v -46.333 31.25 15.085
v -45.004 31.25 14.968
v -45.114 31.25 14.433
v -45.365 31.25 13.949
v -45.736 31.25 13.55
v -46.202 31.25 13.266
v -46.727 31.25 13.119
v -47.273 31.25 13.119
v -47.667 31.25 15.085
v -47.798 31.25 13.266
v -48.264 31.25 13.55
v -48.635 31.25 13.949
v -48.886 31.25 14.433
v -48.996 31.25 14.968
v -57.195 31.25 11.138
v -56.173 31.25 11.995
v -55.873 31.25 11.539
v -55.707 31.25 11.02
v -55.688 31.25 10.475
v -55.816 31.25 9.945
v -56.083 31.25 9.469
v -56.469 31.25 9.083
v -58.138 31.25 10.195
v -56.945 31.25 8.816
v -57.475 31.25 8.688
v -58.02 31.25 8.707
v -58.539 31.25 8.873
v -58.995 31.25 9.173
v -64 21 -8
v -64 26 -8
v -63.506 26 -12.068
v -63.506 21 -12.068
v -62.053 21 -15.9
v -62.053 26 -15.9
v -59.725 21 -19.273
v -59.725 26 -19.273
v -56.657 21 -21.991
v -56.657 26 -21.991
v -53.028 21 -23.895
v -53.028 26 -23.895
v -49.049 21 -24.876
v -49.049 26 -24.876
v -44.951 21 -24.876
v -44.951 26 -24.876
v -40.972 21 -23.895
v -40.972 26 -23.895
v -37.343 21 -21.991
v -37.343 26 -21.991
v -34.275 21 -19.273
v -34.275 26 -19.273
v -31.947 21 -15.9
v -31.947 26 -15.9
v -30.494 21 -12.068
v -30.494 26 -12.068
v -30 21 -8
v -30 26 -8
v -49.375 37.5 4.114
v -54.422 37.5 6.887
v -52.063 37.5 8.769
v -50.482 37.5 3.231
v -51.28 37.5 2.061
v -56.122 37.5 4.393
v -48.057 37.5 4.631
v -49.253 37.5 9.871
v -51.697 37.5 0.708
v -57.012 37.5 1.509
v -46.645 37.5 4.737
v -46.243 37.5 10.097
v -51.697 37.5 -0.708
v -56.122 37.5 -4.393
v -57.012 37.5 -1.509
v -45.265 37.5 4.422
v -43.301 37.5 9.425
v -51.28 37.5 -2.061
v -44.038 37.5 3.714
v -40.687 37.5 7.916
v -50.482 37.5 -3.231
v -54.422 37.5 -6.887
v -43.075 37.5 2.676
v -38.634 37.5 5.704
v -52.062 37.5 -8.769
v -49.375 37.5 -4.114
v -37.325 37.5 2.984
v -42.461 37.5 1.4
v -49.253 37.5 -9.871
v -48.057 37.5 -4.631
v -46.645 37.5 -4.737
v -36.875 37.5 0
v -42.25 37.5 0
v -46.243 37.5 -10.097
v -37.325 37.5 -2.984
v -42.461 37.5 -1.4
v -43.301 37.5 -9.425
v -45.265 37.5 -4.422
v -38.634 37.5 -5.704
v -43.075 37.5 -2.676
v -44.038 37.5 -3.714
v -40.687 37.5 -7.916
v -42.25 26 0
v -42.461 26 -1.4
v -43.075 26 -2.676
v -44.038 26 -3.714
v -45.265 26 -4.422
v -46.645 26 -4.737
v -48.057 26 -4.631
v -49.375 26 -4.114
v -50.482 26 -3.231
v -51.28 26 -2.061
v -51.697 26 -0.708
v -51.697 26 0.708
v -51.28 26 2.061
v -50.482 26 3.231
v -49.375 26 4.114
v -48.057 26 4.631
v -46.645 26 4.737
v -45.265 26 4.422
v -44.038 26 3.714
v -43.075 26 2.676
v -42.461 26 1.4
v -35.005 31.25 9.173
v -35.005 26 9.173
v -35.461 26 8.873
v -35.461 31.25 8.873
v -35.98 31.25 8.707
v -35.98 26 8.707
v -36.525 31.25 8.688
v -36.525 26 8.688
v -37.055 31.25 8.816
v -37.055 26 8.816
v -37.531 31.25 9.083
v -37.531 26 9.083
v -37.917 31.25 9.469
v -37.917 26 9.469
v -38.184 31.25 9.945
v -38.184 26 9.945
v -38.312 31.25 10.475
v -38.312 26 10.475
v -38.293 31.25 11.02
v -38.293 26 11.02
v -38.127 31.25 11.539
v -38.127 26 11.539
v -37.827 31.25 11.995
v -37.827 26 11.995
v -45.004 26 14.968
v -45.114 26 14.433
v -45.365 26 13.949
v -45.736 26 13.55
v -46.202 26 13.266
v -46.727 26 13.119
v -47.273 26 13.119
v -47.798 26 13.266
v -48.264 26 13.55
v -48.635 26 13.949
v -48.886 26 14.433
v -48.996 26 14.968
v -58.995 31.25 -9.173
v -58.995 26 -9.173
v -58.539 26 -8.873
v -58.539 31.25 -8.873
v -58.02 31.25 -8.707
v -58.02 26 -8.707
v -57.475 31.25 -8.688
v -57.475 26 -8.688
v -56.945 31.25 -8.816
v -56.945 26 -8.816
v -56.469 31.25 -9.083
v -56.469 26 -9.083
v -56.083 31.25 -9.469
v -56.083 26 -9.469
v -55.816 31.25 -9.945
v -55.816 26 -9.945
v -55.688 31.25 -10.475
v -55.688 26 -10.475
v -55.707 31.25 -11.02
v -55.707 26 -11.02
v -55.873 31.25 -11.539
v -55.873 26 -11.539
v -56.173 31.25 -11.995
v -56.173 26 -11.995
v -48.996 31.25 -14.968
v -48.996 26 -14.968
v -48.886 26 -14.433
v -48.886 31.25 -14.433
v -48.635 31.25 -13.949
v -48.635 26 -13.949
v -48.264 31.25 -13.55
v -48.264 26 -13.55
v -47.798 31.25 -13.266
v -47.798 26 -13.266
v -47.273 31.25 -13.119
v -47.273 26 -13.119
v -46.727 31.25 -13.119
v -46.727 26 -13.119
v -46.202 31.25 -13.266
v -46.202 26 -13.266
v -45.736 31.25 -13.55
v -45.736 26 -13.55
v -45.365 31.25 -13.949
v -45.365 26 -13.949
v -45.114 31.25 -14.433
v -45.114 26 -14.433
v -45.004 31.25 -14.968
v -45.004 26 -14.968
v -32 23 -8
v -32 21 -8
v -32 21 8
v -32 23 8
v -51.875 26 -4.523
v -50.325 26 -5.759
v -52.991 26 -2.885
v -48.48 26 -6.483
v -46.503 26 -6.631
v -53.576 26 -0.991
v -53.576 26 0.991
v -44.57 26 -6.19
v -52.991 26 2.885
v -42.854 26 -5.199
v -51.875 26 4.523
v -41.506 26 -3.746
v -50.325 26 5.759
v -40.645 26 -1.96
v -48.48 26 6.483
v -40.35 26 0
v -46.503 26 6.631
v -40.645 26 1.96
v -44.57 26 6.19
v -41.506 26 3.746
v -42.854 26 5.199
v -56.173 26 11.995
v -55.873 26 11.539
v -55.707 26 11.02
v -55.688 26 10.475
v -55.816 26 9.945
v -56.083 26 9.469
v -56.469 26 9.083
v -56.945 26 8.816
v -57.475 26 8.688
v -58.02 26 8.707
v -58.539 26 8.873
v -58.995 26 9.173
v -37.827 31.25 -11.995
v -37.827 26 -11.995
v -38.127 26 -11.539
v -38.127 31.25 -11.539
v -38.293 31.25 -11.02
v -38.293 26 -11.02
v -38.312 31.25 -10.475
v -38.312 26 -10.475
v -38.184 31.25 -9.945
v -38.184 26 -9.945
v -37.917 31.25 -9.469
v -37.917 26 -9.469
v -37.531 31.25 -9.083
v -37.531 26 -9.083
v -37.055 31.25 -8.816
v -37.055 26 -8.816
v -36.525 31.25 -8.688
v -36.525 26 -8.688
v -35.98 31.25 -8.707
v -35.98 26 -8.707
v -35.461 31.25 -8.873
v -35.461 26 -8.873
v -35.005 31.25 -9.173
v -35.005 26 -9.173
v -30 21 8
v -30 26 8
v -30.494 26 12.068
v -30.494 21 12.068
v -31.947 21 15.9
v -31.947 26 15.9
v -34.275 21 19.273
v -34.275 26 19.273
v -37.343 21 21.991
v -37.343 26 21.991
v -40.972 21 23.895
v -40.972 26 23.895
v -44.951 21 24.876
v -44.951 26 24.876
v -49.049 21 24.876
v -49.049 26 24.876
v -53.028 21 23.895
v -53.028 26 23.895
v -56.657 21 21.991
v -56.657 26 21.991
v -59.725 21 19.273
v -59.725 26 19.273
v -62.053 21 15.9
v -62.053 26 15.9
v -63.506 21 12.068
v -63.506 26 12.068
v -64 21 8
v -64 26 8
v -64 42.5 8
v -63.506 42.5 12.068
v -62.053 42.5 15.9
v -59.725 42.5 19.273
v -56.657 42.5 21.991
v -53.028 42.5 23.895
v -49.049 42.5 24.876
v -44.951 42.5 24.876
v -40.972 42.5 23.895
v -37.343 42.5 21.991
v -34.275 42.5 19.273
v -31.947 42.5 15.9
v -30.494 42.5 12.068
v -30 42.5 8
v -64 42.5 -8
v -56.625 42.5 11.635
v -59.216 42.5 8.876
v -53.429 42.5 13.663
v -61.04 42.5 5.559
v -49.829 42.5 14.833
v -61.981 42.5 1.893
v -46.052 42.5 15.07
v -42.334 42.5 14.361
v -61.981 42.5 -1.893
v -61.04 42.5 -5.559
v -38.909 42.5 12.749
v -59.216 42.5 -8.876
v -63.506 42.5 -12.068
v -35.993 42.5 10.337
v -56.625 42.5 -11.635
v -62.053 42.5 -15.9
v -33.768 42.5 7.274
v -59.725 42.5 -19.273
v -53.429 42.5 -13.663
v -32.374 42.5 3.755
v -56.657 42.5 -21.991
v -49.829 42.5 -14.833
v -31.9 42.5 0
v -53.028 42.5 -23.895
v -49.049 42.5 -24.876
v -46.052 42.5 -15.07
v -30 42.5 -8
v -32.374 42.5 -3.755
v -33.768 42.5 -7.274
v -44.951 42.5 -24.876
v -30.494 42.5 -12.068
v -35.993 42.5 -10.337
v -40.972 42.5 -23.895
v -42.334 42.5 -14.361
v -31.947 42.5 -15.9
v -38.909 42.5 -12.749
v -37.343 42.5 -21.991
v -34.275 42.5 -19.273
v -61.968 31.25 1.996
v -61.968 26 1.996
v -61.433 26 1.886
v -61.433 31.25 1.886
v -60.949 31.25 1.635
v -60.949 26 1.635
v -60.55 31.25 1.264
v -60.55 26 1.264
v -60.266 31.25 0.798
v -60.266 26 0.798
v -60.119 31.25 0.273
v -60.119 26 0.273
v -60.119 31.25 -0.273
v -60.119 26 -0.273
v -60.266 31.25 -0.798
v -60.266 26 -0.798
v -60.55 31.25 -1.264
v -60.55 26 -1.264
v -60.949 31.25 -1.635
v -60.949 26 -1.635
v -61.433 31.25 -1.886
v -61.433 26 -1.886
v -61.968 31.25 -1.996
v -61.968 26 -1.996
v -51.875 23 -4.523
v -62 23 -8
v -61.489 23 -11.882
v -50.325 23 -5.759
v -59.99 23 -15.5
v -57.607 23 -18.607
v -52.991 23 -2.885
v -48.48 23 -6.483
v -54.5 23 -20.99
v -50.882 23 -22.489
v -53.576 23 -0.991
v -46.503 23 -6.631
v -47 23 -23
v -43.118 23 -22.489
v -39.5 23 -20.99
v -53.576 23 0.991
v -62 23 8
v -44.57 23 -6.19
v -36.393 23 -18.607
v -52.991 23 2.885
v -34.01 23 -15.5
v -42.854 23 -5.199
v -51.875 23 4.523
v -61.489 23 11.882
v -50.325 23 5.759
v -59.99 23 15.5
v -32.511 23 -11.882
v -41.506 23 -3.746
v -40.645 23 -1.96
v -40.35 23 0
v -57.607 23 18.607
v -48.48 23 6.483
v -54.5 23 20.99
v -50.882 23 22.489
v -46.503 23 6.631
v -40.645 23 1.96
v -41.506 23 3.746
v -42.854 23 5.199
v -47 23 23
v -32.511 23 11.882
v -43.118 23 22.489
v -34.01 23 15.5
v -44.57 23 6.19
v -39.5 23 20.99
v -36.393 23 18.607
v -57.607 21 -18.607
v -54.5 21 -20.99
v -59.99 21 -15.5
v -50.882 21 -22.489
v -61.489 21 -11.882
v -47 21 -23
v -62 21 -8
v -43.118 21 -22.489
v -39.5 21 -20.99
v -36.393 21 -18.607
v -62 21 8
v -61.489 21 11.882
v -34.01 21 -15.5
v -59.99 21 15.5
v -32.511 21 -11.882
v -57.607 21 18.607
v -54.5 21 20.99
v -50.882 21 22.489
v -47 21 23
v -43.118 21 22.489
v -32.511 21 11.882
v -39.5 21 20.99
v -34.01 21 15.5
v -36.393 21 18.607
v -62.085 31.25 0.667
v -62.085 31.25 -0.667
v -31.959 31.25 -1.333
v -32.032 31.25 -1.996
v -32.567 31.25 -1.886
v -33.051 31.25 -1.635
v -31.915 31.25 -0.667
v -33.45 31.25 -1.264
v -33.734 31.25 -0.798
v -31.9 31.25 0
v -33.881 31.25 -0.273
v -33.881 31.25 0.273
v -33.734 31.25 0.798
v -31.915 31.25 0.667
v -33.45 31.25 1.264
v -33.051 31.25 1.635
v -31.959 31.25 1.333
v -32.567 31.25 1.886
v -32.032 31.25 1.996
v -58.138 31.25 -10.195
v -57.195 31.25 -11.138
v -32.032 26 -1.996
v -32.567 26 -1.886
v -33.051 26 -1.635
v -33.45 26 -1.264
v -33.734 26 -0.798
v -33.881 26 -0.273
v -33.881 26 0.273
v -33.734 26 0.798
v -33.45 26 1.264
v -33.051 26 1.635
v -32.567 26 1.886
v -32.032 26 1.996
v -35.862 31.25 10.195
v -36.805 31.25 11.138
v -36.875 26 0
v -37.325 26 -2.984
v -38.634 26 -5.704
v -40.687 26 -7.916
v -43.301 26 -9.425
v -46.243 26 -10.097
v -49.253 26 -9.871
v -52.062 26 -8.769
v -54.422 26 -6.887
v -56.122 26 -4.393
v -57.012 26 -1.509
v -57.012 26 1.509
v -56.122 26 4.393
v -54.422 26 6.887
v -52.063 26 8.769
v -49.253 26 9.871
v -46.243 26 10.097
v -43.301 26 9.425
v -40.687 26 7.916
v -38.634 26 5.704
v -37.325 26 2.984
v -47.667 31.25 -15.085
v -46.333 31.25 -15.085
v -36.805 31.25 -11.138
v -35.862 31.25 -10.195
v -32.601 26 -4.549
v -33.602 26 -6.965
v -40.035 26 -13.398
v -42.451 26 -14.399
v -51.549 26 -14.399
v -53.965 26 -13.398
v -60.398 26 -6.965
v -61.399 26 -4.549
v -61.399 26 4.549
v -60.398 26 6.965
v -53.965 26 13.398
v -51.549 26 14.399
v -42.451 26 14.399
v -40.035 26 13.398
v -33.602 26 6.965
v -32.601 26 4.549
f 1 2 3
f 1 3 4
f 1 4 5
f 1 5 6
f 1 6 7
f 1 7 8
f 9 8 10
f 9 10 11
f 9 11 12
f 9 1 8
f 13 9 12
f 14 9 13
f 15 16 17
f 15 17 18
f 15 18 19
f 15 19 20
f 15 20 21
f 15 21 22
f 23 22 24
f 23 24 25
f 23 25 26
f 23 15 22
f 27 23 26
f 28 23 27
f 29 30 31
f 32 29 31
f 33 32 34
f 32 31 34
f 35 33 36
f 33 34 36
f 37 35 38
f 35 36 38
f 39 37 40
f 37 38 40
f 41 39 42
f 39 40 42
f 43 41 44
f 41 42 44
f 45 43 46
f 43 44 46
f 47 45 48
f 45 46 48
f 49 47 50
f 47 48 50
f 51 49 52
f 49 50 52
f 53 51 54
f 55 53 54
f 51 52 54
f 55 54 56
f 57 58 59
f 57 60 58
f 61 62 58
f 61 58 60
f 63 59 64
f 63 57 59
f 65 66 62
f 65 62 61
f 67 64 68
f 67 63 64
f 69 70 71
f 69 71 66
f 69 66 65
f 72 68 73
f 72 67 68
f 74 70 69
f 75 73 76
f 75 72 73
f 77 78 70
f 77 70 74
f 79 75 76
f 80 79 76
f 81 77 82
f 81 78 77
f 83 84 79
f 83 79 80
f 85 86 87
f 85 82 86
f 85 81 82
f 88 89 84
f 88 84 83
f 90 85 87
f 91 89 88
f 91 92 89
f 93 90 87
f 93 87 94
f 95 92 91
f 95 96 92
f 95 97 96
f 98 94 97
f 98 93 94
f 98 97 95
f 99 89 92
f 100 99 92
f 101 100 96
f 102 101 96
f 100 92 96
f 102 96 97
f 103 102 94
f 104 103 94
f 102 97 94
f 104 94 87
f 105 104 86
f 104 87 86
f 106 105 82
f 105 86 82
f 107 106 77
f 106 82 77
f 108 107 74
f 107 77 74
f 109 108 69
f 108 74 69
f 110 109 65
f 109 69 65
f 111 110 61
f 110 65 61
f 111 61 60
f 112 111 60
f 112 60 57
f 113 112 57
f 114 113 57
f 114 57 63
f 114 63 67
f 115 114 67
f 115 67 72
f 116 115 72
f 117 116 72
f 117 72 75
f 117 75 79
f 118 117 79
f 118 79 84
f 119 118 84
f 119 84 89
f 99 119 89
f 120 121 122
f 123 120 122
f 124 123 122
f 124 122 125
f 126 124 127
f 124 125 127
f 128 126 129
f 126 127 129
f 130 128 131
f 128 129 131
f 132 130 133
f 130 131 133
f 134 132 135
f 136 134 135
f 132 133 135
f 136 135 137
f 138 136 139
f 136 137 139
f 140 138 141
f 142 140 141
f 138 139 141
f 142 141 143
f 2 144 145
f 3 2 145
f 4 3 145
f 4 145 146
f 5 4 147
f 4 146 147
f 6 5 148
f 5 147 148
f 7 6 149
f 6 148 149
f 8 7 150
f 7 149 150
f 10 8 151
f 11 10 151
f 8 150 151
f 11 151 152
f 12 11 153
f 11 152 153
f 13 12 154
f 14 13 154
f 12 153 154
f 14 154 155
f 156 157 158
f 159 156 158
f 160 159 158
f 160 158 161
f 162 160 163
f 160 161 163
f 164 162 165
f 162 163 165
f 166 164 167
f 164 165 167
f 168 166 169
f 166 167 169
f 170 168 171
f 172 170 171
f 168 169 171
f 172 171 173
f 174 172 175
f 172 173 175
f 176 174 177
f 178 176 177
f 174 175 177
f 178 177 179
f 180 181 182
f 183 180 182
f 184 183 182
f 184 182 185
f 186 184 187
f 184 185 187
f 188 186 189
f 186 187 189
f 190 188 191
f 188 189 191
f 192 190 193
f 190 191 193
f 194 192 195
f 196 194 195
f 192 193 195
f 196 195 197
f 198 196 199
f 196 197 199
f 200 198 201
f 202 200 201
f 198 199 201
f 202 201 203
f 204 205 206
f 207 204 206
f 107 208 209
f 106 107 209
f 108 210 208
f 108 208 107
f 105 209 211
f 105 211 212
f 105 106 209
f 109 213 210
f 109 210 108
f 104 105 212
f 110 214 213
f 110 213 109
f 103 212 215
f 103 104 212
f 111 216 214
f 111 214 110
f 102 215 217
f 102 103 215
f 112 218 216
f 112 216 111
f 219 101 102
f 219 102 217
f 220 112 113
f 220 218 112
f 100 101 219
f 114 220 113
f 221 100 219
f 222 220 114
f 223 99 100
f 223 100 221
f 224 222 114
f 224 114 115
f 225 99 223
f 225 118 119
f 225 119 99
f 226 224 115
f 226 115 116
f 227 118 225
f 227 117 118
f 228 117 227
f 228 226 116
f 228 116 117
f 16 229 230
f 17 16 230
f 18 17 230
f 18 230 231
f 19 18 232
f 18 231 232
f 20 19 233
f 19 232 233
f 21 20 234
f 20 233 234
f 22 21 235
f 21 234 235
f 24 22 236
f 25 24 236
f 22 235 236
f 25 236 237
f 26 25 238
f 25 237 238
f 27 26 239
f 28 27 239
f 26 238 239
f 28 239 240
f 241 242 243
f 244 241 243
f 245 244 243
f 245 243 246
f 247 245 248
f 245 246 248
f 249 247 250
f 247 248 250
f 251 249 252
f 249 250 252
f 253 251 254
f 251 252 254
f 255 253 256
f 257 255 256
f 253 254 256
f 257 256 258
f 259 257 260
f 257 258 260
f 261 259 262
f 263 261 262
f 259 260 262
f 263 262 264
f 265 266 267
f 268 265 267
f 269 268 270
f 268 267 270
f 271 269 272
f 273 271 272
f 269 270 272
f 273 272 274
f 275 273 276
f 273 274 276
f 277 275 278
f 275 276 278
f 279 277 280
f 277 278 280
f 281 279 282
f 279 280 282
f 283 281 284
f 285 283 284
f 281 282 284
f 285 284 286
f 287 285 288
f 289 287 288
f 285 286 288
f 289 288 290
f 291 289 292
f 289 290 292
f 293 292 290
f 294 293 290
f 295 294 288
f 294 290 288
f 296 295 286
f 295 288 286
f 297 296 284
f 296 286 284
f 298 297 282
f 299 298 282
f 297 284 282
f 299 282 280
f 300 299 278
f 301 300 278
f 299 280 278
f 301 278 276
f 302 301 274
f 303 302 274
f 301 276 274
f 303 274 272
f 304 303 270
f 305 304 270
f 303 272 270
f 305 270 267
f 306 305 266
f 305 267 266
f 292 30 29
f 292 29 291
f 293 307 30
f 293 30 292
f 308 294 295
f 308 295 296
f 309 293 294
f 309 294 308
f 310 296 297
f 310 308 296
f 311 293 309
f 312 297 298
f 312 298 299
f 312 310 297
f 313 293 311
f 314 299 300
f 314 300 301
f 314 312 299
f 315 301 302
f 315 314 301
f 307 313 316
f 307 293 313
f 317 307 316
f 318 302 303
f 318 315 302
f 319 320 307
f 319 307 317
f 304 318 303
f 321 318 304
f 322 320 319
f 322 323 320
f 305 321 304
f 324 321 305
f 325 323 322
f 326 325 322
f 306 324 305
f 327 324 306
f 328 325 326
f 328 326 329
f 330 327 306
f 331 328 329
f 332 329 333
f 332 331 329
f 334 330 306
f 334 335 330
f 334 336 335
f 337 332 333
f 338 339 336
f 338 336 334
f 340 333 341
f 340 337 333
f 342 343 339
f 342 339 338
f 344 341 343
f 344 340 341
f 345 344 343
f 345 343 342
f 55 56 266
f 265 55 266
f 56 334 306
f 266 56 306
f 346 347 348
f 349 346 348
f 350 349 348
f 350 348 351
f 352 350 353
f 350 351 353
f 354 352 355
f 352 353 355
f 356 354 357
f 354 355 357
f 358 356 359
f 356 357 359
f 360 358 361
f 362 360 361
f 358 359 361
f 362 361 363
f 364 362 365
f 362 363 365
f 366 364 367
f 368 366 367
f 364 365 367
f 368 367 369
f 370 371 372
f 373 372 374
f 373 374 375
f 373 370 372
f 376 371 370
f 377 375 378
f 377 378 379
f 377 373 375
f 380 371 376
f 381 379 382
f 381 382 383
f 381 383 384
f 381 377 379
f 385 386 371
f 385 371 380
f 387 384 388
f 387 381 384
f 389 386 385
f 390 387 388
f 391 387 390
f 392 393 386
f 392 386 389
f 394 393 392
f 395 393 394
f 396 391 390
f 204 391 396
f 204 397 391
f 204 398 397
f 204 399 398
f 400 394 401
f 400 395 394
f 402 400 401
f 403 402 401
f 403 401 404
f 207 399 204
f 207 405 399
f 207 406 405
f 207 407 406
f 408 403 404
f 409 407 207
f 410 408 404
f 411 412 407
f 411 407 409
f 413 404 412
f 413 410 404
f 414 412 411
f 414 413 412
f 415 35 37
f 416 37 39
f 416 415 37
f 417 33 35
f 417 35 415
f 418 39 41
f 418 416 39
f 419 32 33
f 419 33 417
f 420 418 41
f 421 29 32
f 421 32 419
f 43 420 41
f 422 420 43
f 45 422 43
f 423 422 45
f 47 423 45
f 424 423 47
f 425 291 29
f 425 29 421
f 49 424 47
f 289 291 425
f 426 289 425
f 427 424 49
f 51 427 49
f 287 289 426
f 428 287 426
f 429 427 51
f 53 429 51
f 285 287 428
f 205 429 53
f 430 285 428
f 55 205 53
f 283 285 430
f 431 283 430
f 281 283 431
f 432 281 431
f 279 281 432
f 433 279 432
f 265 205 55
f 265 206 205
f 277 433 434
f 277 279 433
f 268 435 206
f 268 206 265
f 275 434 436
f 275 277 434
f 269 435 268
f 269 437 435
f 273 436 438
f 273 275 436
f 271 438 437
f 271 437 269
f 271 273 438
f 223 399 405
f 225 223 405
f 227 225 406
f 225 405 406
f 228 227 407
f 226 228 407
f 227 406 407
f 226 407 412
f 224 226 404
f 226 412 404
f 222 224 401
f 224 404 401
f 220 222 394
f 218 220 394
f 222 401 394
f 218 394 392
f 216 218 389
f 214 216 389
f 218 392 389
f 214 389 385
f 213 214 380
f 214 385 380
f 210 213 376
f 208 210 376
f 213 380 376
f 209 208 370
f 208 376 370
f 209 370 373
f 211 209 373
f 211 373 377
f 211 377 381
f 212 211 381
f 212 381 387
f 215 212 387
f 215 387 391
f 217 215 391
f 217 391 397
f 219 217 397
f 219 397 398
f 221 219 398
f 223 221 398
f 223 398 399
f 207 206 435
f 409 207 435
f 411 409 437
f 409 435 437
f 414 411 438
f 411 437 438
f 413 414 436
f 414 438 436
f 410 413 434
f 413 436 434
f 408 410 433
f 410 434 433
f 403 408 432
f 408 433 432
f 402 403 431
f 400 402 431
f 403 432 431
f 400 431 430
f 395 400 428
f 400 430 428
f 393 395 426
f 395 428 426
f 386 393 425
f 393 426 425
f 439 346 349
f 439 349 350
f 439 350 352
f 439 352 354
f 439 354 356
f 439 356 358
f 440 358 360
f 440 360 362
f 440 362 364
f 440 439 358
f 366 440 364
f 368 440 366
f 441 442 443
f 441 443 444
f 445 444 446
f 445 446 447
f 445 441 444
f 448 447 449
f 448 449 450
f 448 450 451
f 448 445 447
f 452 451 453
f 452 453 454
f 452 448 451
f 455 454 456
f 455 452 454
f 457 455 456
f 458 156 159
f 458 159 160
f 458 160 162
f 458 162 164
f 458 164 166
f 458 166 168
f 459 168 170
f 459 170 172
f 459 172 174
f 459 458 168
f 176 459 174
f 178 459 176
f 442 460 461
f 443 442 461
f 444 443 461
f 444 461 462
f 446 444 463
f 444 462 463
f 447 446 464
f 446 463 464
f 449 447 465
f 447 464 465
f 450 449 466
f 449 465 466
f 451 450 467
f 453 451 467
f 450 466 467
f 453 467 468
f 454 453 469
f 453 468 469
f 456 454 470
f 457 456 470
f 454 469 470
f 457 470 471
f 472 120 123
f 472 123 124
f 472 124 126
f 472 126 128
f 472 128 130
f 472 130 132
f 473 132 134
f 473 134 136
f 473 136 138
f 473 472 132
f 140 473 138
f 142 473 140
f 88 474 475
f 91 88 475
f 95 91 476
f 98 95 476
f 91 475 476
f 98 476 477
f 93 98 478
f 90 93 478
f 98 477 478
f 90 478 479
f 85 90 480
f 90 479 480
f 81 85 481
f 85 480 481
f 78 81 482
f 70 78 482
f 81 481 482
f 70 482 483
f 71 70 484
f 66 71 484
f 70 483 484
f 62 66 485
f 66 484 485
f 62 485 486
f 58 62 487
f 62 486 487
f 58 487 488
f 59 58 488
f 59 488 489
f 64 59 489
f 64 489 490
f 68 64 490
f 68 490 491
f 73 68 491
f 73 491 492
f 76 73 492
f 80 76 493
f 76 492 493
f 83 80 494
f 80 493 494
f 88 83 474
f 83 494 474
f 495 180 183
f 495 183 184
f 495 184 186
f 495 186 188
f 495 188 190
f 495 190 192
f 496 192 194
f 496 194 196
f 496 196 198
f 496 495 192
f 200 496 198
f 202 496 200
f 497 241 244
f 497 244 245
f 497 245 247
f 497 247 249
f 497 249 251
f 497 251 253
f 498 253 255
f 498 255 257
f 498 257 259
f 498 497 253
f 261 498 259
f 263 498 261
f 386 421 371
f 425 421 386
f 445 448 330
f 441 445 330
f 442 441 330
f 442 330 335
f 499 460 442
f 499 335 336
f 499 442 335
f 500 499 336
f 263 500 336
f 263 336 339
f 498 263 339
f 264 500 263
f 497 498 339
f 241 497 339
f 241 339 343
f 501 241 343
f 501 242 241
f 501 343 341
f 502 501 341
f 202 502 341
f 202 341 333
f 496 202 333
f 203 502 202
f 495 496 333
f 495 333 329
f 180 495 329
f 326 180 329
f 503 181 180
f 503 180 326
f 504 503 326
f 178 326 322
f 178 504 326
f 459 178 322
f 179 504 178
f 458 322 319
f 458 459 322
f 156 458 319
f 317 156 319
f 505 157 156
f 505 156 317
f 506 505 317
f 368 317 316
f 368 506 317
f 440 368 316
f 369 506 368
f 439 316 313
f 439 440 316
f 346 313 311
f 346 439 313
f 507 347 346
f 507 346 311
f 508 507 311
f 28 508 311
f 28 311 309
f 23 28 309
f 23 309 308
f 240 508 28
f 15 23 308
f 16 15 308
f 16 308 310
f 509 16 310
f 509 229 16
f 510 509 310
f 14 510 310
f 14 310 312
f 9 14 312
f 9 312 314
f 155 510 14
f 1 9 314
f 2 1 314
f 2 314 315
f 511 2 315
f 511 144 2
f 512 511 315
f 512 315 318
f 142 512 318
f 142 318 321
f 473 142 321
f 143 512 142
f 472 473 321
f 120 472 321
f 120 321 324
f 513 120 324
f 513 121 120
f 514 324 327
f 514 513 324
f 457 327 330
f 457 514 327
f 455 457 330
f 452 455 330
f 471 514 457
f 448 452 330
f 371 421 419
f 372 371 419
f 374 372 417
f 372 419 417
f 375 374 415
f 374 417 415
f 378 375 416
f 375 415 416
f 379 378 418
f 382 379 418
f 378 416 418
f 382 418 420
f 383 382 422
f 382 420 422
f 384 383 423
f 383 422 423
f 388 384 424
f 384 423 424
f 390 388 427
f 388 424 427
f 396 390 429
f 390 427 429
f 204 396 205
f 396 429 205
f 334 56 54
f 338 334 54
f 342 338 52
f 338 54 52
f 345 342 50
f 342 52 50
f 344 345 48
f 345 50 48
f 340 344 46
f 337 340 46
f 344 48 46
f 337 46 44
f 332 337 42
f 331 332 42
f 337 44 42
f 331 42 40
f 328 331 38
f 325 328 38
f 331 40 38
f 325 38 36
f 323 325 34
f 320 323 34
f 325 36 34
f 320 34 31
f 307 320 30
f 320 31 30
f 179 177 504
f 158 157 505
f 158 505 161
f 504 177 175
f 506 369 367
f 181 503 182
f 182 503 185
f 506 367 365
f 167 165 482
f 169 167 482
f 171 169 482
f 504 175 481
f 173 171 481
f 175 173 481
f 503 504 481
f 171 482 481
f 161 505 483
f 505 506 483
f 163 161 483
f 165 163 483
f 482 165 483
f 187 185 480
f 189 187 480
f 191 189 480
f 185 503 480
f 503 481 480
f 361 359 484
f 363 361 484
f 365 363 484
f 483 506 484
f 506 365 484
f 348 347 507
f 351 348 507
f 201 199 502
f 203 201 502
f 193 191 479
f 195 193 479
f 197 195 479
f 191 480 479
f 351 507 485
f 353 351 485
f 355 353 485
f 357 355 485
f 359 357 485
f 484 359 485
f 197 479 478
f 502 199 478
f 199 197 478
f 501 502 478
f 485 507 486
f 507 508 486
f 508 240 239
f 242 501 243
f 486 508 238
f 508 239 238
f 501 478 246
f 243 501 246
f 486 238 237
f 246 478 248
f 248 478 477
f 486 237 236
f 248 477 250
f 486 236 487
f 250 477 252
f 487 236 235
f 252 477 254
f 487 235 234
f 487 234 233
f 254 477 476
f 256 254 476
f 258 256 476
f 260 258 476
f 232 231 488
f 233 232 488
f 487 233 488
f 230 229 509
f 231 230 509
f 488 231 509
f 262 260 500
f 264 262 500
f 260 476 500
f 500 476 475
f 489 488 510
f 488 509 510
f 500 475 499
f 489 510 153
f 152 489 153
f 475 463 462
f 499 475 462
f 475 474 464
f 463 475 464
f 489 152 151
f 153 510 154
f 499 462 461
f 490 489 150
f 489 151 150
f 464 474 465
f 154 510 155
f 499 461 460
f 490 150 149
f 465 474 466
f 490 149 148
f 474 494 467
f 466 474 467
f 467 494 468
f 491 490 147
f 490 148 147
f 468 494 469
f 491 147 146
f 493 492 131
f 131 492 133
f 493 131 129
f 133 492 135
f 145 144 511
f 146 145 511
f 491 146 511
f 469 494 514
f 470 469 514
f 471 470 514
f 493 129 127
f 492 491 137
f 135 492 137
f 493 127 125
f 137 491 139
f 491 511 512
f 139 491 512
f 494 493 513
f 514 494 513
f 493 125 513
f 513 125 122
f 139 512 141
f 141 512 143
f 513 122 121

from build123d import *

# Parameters (mm, degrees)
SKETCH_R             = 15.1
PAD_DEPTH            = 16.5
PAD001_DEPTH         = 5.25
POLARPATTERN_COUNT   = 8
PAD002_DEPTH         = 5
SKETCH003_R          = 10.125
PAD003_DEPTH         = 11.5
SKETCH004_R          = 4.75
POCKET_DEPTH         = 16.501
SKETCH006_R          = 6.65
POCKET001_DEPTH      = 5
POCKET002_DEPTH      = 2
BODY_PLACEMENT_ANGLE = 270


with BuildPart() as part:
    # Sketch → Pad (new body)
    with BuildSketch(Plane.XY):
        with BuildLine():
            ThreePointArc((17, 8), (0, 25), (-17, 8))
            Line((-17, 8), (-17, -8))
            ThreePointArc((-17, -8), (0, -25), (17, -8))
            Line((17, -8), (17, 8))
        make_face()
        Circle(SKETCH_R, mode=Mode.SUBTRACT)
    extrude(amount=PAD_DEPTH)

    # Sketch001 → Pad001 (join)
    with BuildSketch(Plane.XY):
        with BuildLine():
            ThreePointArc((1.995609, 14.96755), (0, 15.1), (-1.995609, 14.96755))
            ThreePointArc((-1.995609, 14.96755), (0, 13.1), (1.995609, 14.96755))
        make_face()
    pad001 = extrude(amount=PAD001_DEPTH)

    # PolarPattern: Pad001 ×8 about axis
    polarpattern_axis = Axis((0, 0, 0), (0, 0, 1))
    for i in range(1, POLARPATTERN_COUNT):
        add(pad001.rotate(polarpattern_axis, i * 360 / POLARPATTERN_COUNT))

    # Sketch002 (on Face23 of PolarPattern) → Pad002 (join)
    with BuildSketch(Plane(origin=(0, 0, 0), x_dir=(1, 0, 0), z_dir=(0, 0, -1))):
        with BuildLine():
            ThreePointArc((-17, -8), (0, -25.000054), (17, -8))
            Line((17, -8), (17, 8))
            ThreePointArc((17, 8), (0, 25.000046), (-17, 8))
            Line((-17, -8), (-17, 8))
        make_face()
    extrude(amount=PAD002_DEPTH)

    # Sketch003 (on Face8 of Pad002) → Pad003 (join)
    with BuildSketch(Plane.XY):
        Circle(SKETCH003_R)
    extrude(amount=PAD003_DEPTH)

    # Sketch004 (on Face28 of Pad003) → Pocket (cut, through all)
    with BuildSketch(Plane.XY.offset(11.5)):
        Circle(SKETCH004_R)
    extrude(amount=-POCKET_DEPTH, mode=Mode.SUBTRACT)

    # Sketch006 (on Face8 of Pocket) → Pocket001 (cut)
    with BuildSketch(Plane(origin=(0, 0, -5), x_dir=(1, 0, 0), z_dir=(0, 0, -1))):
        Circle(SKETCH006_R)
    extrude(amount=-POCKET001_DEPTH, mode=Mode.SUBTRACT)

    # Sketch007 (on Face8 of Pocket001) → Pocket002 (cut)
    with BuildSketch(Plane(origin=(0, 0, -5), x_dir=(1, 0, 0), z_dir=(0, 0, -1))):
        with BuildLine():
            ThreePointArc((15, 8), (0, 23.000046), (-15, 8))
            Line((-15, -8), (-15, 8))
            ThreePointArc((-15, -8), (7e-06, -23.000054), (15, -7.999987))
            Line((15, -7.999987), (15, 8))
        make_face()
    extrude(amount=-POCKET002_DEPTH, mode=Mode.SUBTRACT)


with BuildPart() as part_1:
    # Body placement: moved
    add(part.part.moved(Location((-47, 26, 0))).rotate(Axis((-47, 26, 0), (1, 0, 0)), BODY_PLACEMENT_ANGLE))


solid = part_1.part
